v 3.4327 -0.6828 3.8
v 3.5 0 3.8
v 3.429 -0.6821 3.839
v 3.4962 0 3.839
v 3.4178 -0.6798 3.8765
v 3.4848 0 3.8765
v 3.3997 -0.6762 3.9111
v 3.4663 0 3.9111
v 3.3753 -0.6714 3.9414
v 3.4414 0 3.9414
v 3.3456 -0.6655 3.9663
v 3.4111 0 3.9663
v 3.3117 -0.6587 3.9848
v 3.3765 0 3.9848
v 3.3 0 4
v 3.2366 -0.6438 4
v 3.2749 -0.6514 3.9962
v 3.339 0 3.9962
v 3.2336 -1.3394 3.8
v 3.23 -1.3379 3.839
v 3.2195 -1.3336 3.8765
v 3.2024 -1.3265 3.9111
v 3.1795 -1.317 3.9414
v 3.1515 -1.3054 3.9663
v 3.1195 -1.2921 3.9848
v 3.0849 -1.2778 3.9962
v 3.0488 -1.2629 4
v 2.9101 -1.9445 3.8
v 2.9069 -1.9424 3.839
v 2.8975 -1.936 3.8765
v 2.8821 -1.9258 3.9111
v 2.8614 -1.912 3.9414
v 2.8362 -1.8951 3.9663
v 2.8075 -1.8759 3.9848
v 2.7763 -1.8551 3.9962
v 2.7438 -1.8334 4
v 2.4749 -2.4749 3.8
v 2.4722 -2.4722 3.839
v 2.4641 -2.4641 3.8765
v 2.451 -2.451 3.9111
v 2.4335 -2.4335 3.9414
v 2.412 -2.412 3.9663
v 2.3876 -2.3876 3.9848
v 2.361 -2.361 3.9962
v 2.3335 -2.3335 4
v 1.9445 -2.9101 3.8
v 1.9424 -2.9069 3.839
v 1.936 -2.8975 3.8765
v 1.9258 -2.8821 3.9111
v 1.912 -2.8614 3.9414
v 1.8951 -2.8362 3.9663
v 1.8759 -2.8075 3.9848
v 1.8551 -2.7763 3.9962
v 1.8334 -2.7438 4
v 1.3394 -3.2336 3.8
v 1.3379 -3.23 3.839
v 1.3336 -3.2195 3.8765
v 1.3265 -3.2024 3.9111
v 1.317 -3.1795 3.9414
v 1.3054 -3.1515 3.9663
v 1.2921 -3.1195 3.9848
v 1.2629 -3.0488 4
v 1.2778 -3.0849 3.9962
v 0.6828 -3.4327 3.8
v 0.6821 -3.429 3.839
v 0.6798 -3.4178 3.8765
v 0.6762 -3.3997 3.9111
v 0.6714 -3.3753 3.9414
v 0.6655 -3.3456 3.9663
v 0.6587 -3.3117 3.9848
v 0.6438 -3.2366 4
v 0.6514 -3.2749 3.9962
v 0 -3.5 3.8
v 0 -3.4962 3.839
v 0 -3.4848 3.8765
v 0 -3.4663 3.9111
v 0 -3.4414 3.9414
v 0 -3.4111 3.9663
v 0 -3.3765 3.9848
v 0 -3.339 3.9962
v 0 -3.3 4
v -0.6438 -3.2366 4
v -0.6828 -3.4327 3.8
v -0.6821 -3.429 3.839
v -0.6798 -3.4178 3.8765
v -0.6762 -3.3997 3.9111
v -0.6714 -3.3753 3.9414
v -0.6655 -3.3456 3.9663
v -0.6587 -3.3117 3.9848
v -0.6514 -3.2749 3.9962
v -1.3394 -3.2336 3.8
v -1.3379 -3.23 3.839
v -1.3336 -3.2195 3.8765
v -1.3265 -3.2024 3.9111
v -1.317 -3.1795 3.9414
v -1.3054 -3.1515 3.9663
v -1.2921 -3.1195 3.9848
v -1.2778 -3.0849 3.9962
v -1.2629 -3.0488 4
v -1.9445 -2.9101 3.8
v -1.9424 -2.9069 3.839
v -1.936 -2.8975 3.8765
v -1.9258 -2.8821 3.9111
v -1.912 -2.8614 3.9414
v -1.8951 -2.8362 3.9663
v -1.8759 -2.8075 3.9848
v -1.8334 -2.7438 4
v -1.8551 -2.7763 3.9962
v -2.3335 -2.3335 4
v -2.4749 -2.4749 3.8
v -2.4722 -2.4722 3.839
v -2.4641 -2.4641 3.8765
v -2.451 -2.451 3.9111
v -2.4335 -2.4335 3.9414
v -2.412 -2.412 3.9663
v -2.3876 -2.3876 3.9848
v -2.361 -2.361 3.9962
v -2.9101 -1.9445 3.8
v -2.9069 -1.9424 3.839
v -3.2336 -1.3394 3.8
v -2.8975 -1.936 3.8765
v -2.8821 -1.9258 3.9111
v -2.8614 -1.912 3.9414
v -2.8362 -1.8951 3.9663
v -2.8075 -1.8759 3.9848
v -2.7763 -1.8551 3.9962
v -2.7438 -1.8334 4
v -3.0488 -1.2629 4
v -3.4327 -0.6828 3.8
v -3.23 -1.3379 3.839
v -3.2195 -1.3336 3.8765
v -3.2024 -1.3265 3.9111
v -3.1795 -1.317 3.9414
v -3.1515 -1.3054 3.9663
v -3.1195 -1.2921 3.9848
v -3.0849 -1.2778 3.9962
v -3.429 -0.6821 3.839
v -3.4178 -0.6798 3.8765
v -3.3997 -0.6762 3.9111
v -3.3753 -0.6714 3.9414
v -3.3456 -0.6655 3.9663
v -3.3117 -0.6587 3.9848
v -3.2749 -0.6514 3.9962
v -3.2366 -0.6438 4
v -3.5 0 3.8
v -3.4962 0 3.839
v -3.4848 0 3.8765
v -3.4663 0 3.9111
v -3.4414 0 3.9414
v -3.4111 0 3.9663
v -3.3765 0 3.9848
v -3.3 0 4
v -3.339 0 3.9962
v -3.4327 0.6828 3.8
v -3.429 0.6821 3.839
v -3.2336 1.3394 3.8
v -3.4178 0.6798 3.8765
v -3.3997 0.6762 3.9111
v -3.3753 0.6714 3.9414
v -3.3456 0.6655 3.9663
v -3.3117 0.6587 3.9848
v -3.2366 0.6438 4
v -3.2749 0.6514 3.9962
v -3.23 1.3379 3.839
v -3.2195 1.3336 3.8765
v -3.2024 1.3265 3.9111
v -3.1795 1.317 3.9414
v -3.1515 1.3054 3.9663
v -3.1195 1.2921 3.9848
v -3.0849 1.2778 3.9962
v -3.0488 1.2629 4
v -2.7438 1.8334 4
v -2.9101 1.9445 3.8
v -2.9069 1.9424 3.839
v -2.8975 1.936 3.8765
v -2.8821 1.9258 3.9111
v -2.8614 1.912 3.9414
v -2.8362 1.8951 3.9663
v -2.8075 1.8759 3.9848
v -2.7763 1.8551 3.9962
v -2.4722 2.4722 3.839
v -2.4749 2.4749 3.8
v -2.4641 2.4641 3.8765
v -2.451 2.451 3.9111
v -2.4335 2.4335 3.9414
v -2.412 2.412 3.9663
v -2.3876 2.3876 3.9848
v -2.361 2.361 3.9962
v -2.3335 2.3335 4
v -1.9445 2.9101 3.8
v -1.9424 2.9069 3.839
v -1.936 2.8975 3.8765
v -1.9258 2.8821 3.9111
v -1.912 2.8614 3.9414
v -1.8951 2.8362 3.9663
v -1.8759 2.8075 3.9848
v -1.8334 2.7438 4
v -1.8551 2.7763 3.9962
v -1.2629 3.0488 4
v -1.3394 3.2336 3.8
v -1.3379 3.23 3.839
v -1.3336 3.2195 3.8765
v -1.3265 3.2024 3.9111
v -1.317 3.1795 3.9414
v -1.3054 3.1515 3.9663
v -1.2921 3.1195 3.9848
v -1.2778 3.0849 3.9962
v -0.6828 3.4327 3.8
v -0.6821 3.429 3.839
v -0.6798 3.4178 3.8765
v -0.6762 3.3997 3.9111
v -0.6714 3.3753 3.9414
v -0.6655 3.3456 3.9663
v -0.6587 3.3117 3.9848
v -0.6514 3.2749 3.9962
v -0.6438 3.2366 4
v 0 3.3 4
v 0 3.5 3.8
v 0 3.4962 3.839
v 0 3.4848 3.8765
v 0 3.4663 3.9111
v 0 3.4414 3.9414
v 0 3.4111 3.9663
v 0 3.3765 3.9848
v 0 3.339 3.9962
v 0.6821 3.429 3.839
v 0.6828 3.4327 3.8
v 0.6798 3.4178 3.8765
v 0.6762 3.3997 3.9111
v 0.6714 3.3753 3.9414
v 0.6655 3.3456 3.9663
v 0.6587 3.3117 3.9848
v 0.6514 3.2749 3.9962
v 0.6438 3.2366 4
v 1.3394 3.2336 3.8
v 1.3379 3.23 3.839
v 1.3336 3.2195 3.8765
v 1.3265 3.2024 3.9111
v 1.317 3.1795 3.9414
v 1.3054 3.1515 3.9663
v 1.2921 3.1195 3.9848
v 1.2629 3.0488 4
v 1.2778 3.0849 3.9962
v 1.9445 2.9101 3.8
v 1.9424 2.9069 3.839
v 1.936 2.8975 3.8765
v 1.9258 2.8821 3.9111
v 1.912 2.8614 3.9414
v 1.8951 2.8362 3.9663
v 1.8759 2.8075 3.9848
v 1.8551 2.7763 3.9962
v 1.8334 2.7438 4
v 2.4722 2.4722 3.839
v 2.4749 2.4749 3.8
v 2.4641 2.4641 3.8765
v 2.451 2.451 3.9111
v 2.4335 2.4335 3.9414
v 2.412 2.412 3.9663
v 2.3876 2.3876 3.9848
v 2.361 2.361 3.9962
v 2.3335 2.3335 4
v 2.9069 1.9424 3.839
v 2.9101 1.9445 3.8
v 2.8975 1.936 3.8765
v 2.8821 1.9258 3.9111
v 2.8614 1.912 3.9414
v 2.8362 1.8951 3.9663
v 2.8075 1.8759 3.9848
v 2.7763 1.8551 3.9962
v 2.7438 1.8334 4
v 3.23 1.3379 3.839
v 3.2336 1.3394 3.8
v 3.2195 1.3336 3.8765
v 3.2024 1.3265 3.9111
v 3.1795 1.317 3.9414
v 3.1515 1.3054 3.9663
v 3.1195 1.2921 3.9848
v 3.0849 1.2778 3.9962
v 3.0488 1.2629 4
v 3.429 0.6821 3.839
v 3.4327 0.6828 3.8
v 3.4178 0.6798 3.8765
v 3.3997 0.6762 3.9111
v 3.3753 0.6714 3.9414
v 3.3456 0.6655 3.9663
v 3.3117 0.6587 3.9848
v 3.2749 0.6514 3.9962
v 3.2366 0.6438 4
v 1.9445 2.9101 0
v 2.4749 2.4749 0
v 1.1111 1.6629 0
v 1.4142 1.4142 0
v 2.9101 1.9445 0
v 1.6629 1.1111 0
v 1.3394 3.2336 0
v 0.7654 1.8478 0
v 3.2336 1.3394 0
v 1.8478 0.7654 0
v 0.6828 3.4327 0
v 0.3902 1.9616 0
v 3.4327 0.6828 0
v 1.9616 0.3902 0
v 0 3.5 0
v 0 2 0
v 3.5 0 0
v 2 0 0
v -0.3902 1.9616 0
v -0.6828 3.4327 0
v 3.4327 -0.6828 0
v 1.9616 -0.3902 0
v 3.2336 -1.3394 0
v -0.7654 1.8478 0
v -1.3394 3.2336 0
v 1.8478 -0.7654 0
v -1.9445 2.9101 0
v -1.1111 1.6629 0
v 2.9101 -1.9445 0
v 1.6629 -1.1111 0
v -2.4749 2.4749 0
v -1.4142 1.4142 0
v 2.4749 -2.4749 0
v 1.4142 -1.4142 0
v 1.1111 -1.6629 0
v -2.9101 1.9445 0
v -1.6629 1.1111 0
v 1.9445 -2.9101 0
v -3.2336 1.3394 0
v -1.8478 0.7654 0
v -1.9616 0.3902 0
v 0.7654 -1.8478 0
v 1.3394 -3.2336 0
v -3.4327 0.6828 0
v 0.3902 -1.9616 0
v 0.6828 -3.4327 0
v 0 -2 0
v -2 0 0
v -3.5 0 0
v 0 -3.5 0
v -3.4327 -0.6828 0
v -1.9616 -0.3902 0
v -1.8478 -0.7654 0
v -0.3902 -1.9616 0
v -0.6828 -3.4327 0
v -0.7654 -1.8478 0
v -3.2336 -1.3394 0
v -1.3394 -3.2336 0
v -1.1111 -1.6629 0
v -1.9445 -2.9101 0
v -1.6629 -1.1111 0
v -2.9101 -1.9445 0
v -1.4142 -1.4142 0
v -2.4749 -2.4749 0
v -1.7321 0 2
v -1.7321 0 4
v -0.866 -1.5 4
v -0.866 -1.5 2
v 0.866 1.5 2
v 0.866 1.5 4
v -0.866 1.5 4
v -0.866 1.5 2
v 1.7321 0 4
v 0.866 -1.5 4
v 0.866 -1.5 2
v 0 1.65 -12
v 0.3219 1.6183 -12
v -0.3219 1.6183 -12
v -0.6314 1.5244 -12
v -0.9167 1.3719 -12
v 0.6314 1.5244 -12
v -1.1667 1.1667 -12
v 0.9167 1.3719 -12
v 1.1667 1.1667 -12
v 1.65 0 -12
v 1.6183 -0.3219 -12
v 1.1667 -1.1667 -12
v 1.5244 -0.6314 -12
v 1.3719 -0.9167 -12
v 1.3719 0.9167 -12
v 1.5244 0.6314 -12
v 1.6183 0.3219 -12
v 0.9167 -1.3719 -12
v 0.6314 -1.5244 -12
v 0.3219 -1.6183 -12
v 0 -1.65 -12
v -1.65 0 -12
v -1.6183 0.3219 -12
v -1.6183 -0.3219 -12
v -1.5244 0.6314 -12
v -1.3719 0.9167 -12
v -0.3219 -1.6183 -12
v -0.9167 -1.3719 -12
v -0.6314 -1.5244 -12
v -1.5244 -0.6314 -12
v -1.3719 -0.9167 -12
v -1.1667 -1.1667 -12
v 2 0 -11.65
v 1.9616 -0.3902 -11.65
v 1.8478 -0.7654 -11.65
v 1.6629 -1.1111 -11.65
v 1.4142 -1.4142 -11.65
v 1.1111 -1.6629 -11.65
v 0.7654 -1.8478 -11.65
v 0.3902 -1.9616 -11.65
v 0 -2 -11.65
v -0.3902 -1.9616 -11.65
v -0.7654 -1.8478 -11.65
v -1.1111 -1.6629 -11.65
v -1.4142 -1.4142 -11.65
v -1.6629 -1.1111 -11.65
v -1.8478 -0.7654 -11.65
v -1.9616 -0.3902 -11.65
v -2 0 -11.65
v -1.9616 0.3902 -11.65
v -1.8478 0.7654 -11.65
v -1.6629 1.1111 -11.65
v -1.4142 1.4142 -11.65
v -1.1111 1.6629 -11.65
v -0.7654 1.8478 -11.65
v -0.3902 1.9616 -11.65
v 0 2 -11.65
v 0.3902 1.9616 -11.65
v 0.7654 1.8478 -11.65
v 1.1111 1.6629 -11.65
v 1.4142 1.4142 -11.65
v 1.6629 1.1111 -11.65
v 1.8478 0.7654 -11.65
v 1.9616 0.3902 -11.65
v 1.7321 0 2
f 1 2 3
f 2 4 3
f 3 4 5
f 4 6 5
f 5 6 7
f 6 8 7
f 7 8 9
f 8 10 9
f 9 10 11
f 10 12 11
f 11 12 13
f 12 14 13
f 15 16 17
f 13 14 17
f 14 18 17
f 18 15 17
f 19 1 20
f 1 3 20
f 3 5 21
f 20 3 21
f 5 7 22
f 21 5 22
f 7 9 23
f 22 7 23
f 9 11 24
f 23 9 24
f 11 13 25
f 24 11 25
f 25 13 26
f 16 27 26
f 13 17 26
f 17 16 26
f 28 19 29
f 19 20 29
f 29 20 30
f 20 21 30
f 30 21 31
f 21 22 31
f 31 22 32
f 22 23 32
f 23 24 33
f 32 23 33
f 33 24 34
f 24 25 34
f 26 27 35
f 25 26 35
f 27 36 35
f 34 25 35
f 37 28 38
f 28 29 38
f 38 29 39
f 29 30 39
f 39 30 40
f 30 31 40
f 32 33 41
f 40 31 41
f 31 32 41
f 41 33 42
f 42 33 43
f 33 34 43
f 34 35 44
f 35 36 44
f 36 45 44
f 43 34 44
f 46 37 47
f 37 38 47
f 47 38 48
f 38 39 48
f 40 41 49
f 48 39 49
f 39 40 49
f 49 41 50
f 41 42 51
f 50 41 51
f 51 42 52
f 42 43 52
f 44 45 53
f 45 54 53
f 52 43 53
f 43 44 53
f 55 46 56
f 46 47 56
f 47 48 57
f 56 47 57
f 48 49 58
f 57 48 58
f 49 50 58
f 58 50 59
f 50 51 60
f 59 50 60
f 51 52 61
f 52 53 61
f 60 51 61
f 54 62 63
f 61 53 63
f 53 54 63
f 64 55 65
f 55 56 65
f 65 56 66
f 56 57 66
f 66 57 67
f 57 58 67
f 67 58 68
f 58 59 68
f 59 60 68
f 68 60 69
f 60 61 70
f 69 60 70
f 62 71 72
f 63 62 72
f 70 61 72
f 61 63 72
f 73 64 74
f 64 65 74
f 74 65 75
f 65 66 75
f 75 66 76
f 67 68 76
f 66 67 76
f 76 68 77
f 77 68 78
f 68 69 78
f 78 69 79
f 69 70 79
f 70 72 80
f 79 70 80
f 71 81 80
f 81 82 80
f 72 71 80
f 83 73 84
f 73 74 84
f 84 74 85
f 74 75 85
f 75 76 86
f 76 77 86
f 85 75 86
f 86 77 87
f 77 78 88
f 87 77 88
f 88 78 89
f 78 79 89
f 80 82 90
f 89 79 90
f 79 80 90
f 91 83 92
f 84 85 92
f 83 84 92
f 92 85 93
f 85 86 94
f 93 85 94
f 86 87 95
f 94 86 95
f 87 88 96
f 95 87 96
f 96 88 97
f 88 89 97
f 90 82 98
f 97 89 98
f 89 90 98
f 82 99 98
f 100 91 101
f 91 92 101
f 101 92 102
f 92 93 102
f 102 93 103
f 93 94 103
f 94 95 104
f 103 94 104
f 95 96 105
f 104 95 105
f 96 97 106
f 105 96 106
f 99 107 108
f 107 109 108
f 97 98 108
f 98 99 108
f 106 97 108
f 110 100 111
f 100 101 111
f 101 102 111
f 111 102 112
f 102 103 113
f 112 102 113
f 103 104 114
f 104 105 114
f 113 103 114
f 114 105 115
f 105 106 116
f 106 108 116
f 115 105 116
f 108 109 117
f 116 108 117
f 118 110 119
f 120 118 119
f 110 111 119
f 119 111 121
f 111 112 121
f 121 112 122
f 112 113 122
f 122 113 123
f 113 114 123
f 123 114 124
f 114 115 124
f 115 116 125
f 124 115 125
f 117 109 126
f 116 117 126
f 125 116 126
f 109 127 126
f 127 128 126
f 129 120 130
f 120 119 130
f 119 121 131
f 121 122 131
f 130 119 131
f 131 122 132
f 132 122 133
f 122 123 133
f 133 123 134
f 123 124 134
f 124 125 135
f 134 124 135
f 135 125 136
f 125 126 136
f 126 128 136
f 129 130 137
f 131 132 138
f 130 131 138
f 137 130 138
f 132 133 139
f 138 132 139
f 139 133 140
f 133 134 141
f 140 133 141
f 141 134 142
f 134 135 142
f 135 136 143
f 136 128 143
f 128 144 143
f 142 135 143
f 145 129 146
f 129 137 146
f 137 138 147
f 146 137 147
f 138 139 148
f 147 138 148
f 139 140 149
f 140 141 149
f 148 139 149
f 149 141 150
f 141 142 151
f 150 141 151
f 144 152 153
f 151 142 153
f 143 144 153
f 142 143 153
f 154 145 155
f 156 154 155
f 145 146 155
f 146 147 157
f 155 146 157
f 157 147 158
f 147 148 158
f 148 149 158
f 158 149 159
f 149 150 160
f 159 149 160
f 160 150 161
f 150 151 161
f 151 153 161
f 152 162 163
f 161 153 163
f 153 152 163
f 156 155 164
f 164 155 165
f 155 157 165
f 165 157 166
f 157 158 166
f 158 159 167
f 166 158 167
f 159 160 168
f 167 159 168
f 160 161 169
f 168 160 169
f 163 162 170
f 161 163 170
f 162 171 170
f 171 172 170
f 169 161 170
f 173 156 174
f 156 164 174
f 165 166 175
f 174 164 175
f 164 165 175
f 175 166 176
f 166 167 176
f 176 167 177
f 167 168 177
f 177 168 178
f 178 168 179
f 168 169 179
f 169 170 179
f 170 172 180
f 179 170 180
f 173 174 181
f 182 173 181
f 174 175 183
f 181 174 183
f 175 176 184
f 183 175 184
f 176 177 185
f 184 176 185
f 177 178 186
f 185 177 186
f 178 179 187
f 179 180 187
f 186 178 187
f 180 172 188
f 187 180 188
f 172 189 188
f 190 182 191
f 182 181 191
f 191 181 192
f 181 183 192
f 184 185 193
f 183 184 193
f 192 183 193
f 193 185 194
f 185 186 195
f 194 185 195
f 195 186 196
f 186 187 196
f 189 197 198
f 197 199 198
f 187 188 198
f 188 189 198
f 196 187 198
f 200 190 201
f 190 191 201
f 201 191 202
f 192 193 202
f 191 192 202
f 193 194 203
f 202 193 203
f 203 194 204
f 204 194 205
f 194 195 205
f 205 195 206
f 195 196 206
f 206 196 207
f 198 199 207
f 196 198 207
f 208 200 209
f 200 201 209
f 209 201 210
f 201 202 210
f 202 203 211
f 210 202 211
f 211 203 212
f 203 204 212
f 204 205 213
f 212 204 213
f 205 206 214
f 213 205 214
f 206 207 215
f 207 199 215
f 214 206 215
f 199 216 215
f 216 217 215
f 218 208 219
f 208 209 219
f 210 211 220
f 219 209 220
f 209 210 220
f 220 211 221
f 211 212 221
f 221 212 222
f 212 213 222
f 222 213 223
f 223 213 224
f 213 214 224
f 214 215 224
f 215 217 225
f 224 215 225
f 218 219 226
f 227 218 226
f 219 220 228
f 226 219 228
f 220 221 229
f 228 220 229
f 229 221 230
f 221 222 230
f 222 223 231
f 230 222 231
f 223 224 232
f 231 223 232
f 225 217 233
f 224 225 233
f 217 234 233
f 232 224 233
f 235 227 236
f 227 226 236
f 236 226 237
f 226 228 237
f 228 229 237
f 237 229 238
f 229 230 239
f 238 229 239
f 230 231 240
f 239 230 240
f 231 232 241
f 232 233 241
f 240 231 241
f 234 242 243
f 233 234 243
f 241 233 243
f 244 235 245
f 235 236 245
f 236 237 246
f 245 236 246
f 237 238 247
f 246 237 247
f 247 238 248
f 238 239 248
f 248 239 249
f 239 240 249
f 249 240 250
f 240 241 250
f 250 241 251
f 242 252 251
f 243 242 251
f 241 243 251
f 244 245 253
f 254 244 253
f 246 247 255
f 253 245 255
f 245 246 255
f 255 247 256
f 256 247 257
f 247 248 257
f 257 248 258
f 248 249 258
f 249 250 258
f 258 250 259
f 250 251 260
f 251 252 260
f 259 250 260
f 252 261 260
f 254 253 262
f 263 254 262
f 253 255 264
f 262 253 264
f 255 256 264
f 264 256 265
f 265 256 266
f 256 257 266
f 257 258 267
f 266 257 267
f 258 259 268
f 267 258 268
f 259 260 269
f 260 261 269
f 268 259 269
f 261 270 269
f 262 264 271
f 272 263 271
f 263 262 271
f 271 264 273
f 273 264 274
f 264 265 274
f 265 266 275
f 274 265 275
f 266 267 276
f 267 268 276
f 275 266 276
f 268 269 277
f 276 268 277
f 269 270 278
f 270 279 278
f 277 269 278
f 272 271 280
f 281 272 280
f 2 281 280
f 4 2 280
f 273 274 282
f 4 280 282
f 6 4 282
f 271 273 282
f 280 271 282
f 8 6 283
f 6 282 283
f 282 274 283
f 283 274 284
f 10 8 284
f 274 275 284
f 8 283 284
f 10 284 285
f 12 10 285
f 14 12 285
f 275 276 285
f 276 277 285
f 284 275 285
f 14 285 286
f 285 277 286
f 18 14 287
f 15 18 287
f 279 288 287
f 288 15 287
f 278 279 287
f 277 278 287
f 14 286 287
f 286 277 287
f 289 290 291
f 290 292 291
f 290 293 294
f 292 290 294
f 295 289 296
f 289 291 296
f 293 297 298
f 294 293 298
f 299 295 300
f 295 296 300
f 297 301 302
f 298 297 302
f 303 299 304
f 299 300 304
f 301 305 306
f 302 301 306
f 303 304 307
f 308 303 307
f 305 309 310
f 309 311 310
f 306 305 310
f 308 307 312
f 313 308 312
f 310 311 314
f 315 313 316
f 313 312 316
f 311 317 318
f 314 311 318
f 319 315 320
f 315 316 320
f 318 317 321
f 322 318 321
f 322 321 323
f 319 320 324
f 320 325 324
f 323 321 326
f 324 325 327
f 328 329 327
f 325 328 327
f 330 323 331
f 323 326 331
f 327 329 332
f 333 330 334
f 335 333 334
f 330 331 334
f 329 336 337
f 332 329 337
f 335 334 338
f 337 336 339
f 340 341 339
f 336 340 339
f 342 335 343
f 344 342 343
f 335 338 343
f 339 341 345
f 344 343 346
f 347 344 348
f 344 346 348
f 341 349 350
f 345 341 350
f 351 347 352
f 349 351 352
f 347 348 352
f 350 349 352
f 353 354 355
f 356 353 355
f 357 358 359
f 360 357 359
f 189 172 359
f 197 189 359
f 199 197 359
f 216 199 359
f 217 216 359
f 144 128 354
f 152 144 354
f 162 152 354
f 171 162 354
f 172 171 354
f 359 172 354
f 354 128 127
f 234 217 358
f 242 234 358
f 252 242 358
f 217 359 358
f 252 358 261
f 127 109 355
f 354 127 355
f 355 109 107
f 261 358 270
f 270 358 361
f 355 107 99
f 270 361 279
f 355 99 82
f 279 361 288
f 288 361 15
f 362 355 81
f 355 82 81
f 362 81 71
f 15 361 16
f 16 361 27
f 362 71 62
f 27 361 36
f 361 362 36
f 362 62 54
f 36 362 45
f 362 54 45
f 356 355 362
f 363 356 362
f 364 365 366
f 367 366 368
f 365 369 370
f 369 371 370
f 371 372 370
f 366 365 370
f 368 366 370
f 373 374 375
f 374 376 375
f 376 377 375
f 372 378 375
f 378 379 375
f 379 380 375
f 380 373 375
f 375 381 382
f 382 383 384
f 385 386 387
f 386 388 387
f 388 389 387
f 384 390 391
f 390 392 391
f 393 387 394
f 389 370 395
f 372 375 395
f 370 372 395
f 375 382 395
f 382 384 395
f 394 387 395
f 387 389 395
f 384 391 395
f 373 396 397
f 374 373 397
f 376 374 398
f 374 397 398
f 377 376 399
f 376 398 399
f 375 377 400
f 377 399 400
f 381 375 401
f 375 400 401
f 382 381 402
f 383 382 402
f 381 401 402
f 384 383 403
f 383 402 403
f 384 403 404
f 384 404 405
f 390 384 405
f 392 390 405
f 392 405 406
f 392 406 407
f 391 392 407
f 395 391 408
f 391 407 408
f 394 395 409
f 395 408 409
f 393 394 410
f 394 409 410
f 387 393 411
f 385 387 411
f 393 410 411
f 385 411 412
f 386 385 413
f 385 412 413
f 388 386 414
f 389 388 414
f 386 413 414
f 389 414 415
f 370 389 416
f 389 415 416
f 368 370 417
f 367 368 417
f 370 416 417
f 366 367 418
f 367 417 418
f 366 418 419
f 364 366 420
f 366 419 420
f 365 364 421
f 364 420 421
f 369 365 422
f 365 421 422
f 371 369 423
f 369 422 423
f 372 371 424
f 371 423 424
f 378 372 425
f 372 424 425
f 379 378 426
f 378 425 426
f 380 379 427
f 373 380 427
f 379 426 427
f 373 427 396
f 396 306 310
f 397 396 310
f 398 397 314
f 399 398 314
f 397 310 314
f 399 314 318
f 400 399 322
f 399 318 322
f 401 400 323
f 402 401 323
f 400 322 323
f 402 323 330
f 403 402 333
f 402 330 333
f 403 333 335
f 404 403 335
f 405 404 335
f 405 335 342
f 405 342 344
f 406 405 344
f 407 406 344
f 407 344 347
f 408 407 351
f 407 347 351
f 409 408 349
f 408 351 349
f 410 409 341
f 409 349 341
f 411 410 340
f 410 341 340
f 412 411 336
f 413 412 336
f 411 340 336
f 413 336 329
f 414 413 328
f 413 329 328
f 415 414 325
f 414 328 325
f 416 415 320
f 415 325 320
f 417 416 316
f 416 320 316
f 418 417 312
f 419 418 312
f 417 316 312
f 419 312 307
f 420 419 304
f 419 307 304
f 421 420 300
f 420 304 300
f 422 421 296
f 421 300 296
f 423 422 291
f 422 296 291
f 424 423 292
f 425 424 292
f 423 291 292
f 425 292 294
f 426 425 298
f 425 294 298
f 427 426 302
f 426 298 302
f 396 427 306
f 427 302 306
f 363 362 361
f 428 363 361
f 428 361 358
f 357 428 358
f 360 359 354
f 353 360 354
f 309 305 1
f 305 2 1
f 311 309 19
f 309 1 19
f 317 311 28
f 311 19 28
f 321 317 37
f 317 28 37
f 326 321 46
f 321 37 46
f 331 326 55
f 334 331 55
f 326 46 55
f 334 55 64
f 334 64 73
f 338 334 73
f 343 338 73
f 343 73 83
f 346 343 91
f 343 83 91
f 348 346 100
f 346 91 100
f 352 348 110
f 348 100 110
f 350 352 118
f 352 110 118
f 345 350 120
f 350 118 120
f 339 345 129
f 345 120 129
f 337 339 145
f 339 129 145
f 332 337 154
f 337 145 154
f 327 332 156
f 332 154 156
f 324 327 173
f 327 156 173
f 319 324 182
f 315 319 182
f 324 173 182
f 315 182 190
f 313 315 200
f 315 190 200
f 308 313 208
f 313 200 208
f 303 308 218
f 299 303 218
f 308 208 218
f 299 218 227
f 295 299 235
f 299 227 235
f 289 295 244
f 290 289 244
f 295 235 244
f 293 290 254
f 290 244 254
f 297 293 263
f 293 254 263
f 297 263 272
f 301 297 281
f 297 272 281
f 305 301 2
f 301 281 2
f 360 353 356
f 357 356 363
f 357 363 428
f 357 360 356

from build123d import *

# Parameters (mm, degrees)
CUT_EXTRUDE1_DEPTH = 2
CHAMFER1_SIZE      = 0.35


with BuildPart() as part:
    # Sketch1 → Revolve1 (revolve)
    with BuildSketch(Plane.XZ, mode=Mode.PRIVATE) as revolve1_sk:
        with BuildLine():
            Line((0, -12), (-2, -12))
            Line((-2, -12), (-2, 0))
            Line((-2, 0), (-3.5, 0))
            Line((-3.5, 0), (-3.5, 3.8))
            ThreePointArc((-3.5, 3.8), (-3.441421356, 3.941421356), (-3.3, 4))
            Line((-3.3, 4), (0, 4))
            Line((0, 4), (0, -12))
        make_face()
    revolve(revolve1_sk.sketch.rotate(Axis((0, 0, 4), (0, 0, -1)), 180), axis=Axis((0, 0, 4), (0, 0, -1)))

    # Sketch2 → Cut-Extrude1 (cut)
    with BuildSketch(Plane.XY.offset(4)):
        Polygon((1.732050808, 0), (0.866025404, 1.5), (-0.866025404, 1.5), (-1.732050808, 0), (-0.866025404, -1.5), (0.866025404, -1.5), align=None)
    extrude(amount=-CUT_EXTRUDE1_DEPTH, mode=Mode.SUBTRACT)

    # Chamfer1
    chamfer1_edges = [part.edges().sort_by_distance(p)[0] for p in [
        (-2, 0, -12),
    ]]
    chamfer(chamfer1_edges, length=CHAMFER1_SIZE)


solid = part.part
